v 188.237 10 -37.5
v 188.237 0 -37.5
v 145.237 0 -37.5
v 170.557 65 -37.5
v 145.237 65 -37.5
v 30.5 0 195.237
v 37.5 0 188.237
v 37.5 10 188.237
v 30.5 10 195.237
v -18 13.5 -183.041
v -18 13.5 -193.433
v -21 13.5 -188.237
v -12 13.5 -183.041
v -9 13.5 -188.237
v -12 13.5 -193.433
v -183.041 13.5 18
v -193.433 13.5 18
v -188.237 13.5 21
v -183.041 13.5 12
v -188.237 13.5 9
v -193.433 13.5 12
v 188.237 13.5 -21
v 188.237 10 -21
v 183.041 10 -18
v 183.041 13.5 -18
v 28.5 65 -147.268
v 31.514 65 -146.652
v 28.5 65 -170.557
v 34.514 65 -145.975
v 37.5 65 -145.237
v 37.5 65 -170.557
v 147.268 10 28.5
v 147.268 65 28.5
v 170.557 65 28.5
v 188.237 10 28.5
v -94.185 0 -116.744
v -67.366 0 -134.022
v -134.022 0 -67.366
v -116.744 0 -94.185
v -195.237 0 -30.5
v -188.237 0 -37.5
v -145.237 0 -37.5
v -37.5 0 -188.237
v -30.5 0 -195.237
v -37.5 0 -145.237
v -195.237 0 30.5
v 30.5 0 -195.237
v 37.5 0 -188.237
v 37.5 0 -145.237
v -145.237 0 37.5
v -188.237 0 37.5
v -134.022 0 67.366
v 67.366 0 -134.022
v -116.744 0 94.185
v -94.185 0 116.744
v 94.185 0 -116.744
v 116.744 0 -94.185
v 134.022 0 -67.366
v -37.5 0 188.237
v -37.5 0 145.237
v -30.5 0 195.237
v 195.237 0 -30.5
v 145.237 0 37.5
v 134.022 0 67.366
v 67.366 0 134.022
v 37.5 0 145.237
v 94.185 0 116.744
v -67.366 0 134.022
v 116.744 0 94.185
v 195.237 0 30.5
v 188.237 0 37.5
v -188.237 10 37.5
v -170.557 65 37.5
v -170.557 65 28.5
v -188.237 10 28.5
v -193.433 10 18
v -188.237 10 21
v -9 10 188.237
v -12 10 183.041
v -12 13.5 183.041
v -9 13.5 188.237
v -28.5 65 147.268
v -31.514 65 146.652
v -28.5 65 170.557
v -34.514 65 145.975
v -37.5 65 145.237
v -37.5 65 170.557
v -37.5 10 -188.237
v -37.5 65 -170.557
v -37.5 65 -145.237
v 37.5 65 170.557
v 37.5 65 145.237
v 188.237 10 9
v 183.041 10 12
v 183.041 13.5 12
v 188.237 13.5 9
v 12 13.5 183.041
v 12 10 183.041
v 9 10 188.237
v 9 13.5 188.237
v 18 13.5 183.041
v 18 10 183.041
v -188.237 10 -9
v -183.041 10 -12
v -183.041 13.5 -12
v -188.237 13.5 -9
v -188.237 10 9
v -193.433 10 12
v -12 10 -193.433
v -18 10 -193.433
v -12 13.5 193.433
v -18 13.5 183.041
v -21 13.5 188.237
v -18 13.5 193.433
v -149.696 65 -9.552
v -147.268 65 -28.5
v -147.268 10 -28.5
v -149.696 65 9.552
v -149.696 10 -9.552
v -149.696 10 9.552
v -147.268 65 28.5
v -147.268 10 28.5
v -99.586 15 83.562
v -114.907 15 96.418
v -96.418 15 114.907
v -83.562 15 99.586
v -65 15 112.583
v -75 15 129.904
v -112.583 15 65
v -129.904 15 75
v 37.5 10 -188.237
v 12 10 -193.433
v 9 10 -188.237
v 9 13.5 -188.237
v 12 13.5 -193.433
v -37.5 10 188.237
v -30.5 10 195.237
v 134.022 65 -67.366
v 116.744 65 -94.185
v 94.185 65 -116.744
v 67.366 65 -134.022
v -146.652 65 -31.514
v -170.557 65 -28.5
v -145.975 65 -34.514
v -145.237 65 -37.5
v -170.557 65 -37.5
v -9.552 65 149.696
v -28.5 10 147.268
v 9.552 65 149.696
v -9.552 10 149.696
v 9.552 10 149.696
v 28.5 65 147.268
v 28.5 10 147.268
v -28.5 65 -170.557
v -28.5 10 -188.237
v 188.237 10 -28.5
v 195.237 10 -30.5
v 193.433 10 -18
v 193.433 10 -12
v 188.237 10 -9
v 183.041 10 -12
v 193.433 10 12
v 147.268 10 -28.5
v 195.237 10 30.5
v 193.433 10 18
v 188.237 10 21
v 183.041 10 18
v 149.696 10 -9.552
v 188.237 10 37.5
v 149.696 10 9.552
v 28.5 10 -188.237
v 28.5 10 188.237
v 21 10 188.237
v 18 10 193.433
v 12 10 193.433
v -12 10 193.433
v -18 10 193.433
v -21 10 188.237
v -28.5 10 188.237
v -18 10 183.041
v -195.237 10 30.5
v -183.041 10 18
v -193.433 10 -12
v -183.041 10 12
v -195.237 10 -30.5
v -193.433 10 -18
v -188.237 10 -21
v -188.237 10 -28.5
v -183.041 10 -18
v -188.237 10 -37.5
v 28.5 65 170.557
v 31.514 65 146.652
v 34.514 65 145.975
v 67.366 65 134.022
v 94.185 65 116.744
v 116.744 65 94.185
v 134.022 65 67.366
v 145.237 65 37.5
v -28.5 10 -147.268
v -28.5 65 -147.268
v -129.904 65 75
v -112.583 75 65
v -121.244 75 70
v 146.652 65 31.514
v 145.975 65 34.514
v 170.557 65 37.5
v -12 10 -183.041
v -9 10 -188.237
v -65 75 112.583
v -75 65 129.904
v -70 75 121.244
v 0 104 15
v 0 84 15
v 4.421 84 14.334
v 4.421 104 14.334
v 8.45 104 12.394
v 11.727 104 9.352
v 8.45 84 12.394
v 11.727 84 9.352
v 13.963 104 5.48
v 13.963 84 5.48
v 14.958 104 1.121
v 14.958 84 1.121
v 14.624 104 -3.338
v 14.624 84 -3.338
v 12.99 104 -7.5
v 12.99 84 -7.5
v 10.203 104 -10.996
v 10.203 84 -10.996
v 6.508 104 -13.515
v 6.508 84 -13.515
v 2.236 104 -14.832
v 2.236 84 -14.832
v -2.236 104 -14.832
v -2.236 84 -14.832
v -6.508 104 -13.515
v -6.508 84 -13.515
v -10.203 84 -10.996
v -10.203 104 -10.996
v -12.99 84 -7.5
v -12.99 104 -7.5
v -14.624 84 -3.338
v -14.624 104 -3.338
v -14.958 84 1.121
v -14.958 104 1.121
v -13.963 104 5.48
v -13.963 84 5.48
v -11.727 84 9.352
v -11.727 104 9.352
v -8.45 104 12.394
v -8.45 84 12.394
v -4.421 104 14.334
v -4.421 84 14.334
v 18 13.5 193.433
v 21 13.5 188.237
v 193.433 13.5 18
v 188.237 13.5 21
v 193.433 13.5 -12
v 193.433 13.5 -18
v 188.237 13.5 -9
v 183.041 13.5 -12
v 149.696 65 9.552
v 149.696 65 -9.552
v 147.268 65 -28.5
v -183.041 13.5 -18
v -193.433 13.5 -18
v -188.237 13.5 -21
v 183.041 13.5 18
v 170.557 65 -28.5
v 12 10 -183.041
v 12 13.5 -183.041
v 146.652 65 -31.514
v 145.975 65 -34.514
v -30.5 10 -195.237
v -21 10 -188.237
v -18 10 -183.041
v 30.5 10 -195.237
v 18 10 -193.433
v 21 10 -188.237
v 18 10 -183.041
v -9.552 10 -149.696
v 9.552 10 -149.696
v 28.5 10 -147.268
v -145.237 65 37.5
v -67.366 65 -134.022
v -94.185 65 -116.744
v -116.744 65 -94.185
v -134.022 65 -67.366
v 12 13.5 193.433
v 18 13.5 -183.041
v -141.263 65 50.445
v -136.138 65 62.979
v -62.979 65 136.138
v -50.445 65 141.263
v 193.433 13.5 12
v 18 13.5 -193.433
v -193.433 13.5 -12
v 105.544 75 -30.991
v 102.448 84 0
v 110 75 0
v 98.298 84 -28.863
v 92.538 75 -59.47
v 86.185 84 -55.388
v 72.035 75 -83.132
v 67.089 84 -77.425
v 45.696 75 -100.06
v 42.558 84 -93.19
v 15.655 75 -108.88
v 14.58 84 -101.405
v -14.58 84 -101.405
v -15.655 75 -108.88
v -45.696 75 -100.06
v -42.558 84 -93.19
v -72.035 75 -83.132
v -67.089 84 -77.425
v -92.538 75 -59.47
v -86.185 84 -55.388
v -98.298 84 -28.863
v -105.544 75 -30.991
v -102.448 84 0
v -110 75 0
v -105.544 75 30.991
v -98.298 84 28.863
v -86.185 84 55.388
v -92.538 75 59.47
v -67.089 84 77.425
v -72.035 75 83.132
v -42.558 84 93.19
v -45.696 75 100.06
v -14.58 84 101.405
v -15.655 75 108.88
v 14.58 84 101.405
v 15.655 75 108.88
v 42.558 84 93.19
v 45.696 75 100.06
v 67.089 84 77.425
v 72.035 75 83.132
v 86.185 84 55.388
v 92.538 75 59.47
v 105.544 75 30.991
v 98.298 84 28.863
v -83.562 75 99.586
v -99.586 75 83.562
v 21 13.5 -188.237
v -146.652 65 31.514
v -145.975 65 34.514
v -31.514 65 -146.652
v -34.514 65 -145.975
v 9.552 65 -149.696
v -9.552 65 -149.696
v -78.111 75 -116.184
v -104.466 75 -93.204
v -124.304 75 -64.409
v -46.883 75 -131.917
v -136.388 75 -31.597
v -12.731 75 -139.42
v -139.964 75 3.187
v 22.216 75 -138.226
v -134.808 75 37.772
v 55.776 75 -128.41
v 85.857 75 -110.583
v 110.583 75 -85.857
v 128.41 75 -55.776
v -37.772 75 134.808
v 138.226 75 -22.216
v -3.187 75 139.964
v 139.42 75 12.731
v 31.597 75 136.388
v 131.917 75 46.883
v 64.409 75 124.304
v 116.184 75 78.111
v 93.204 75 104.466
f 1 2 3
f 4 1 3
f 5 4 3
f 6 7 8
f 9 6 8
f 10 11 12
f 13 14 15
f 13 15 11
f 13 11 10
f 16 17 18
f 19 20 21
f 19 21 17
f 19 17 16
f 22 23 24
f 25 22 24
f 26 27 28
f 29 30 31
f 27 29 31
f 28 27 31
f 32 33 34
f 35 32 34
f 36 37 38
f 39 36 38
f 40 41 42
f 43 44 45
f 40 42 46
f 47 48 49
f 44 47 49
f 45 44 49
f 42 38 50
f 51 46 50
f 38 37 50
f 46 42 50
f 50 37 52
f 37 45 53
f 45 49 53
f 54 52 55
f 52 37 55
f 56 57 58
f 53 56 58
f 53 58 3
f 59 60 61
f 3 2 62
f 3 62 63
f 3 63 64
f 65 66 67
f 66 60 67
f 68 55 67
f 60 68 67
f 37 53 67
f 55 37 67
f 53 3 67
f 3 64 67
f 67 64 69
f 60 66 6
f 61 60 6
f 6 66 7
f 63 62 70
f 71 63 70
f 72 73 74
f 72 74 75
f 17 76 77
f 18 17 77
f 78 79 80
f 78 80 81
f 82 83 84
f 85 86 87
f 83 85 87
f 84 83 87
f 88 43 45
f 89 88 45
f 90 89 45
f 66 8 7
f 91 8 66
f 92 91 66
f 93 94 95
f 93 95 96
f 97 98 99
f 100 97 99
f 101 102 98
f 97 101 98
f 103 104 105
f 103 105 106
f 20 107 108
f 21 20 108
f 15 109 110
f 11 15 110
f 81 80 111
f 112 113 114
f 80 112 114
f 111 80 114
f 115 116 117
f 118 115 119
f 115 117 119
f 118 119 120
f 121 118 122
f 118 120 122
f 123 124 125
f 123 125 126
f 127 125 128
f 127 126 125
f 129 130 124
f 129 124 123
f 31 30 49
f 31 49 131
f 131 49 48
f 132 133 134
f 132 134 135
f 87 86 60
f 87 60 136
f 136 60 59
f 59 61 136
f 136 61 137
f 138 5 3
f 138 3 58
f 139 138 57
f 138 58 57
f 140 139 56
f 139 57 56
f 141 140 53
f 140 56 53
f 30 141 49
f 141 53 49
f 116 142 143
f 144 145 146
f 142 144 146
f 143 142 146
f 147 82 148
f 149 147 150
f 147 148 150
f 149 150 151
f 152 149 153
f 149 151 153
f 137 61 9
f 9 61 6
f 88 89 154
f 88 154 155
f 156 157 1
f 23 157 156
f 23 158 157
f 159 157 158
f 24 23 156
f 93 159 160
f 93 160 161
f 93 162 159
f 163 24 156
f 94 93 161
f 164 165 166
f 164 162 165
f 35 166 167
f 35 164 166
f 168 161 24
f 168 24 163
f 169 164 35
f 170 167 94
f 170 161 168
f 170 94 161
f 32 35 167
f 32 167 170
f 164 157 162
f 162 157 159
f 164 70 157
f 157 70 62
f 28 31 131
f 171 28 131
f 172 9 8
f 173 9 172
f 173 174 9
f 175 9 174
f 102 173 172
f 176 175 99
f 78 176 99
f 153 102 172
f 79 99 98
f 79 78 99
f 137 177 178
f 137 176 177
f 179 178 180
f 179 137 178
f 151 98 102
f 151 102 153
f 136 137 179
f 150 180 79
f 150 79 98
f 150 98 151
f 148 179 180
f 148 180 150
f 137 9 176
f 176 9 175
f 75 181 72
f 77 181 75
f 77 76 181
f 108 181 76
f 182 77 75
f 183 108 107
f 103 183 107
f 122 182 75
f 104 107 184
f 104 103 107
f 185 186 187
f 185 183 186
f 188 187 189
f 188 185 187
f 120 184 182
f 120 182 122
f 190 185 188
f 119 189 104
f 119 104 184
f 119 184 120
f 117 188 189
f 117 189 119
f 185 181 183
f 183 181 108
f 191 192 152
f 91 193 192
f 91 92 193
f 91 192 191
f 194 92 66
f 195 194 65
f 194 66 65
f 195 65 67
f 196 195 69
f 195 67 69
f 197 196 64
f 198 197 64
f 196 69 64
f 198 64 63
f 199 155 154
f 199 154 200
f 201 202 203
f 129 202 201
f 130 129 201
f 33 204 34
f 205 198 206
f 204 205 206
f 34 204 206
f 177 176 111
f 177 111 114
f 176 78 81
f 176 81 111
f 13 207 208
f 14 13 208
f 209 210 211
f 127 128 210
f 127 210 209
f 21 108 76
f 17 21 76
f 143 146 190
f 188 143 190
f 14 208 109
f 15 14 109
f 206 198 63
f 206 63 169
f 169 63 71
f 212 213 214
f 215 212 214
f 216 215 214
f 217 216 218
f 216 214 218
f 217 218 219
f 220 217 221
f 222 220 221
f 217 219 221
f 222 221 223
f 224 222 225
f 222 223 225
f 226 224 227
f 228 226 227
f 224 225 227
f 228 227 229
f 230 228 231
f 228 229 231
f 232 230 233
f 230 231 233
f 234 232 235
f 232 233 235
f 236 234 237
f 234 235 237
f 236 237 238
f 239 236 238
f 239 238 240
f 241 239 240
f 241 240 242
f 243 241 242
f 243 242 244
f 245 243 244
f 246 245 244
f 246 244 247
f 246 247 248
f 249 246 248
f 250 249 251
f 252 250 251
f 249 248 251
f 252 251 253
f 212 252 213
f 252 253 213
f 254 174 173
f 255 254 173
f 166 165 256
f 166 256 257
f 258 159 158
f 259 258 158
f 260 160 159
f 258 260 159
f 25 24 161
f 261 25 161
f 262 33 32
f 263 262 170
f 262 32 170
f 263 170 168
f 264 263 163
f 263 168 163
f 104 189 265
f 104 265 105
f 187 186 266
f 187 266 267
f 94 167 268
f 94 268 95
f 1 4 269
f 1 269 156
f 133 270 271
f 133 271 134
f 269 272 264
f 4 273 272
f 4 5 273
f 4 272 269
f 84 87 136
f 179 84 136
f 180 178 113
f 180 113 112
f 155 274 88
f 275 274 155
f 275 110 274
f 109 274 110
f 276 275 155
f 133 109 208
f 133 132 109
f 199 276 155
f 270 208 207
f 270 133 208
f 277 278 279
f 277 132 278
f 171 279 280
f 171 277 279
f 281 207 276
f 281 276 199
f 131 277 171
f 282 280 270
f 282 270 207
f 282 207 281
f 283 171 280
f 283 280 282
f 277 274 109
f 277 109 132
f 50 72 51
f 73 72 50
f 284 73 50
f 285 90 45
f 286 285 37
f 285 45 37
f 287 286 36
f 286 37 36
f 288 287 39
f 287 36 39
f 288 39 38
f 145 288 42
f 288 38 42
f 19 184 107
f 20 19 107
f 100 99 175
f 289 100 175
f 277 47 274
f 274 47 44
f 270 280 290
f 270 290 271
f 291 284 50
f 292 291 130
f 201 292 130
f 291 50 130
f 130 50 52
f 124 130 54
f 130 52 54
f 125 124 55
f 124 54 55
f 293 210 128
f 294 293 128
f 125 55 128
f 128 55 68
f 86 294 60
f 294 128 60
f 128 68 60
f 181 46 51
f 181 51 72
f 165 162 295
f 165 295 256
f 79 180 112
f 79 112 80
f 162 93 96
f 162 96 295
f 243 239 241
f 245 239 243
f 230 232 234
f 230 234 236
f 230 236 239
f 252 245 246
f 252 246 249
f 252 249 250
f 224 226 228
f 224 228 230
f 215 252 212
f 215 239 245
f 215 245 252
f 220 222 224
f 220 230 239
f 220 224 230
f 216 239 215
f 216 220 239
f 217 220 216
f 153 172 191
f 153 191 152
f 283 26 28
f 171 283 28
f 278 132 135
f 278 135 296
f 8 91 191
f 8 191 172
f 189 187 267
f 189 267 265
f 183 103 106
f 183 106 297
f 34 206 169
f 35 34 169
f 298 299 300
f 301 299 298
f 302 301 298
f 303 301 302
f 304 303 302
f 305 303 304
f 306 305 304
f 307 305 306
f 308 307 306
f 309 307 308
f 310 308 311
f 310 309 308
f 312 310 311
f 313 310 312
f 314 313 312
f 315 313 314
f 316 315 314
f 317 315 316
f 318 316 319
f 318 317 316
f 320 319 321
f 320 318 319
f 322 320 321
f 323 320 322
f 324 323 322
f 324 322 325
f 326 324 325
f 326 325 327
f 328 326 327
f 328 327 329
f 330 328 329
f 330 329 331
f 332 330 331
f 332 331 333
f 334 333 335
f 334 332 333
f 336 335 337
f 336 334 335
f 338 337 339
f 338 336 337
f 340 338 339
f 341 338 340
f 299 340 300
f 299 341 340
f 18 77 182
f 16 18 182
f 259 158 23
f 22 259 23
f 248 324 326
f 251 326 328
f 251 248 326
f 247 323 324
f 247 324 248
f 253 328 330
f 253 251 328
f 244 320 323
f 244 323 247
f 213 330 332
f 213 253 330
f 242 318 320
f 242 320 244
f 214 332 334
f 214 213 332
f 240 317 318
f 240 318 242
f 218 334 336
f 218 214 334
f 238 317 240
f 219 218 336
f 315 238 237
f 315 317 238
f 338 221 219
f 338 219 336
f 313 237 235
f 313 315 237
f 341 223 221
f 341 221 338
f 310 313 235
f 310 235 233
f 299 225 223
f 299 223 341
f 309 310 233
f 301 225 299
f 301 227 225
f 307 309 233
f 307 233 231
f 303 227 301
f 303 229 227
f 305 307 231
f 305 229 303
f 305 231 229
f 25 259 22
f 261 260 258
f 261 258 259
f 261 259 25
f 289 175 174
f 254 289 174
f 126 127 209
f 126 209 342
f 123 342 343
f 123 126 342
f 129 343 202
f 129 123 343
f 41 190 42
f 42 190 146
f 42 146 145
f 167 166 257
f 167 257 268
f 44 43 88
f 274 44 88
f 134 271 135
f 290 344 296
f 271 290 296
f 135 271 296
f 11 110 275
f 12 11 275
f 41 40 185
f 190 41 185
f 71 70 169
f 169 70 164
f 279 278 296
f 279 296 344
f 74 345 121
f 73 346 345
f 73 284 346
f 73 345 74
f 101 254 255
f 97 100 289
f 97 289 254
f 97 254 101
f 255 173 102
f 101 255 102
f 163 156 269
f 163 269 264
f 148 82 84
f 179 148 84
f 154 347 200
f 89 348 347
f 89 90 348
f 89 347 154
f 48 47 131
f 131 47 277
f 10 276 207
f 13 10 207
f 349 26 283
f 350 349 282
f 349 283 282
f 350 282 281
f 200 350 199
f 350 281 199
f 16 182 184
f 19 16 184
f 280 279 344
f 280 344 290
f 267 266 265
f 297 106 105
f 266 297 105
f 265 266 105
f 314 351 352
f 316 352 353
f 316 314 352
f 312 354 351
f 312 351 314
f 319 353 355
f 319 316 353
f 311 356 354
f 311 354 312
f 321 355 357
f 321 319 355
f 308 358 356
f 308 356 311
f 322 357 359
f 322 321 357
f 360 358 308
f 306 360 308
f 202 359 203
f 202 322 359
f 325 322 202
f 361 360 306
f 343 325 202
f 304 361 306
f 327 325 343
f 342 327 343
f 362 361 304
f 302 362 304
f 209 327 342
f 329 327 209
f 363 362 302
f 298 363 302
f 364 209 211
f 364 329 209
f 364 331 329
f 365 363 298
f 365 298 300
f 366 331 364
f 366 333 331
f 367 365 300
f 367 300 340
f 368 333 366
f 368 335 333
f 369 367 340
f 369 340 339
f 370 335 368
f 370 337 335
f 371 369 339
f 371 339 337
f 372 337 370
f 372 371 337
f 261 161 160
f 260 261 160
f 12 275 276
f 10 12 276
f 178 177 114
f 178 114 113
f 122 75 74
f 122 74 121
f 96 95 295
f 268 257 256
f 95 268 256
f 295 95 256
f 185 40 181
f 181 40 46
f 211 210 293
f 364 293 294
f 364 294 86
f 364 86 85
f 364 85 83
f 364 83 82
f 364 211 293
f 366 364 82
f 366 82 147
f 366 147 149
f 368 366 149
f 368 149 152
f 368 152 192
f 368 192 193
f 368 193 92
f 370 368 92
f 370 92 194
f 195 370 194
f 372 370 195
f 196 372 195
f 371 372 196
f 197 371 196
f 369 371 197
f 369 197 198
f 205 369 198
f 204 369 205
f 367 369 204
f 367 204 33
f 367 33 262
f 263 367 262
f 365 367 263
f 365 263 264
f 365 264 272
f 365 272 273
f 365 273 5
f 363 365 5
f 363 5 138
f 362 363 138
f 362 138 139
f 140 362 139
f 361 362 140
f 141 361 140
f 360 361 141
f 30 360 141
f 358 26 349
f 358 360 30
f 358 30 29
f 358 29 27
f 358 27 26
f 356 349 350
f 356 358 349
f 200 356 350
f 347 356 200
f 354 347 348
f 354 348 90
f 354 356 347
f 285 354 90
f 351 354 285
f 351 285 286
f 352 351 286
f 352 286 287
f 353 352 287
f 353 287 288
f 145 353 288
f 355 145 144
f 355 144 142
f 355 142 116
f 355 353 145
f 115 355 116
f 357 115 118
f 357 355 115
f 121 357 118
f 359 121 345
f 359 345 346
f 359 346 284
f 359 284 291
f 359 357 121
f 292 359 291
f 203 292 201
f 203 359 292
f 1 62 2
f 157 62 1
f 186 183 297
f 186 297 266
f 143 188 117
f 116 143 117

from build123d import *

# Parameters (mm, degrees)
SKETCH1_R                    = 150
BOSS_EXTRUDE1_DEPTH          = 75
CHAMFER1_SIZE                = 10
BOSS_EXTRUDE2_START          = -75
BOSS_EXTRUDE2_DEPTH          = 10
CHAMFER2_SIZE                = 7
BOSS_EXTRUDE3_DEPTH          = 9
BOSS_EXTRUDE4_DEPTH          = 3.5
CIRPATTERN1_COUNT            = 4
CIRPATTERN1_COPY_1_DEPTH     = 9
CIRPATTERN1_COPY_2_DEPTH     = 9
CIRPATTERN1_COPY_3_DEPTH     = 9
CIRPATTERN1_COPY_4_DEPTH     = 3.5
CIRPATTERN1_COPY_5_DEPTH     = 3.5
CIRPATTERN1_COPY_6_DEPTH     = 3.5
CHAMFER2_OF_CIRPATTERN1_SIZE = 7
CUT_EXTRUDE1_START           = -60
CUT_EXTRUDE1_DEPTH           = 60
SKETCH6_R                    = 110
BOSS_EXTRUDE5_DEPTH          = 9
BOSS_EXTRUDE5_TAPER          = 40
SKETCH7_R                    = 15
BOSS_EXTRUDE6_DEPTH          = 20


with BuildPart() as part:
    # Sketch1 → Boss-Extrude1 (new body)
    with BuildSketch(Plane(origin=(0, 0, 0), x_dir=(1, 0, 0), z_dir=(0, 1, 0))):
        with Locations(Location((0, 0, 0), (0, 0, 270))):
            Circle(SKETCH1_R)
    extrude(amount=BOSS_EXTRUDE1_DEPTH)

    # Chamfer1
    chamfer1_edges = [part.edges().sort_by_distance(p)[0] for p in [
        (0, 75, -150),
    ]]
    chamfer(chamfer1_edges, length=CHAMFER1_SIZE)

    # Sketch2 → Boss-Extrude2 (add)
    with BuildSketch(Plane(origin=(0, 75, 0), x_dir=(1, 0, 0), z_dir=(0, 1, 0)).offset(BOSS_EXTRUDE2_START)):
        with BuildLine():
            Line((-145.236875483, 37.5), (-195.236875483, 37.5))
            Line((-195.236875483, 37.5), (-195.236875483, -37.5))
            Line((-195.236875483, -37.5), (-145.236875483, -37.5))
            ThreePointArc((-145.236875483, -37.5), (-150, 0), (-145.236875483, 37.5))
        make_face()
    boss_extrude2 = extrude(amount=BOSS_EXTRUDE2_DEPTH)

    # Chamfer2
    chamfer2_edges = [part.edges().sort_by_distance(p)[0] for p in [
        (-195.236875483, 5, -37.5),
        (-195.236875483, 5, 37.5),
    ]]
    chamfer(chamfer2_edges, length=CHAMFER2_SIZE)

    # Sketch3 → Boss-Extrude3 (add)
    with BuildSketch(Plane.XY.offset(37.5)):
        Polygon((-145.236875483, 10), (-145.236875483, 65), (-170.556875483, 65), (-188.236875483, 10), align=None)
    boss_extrude3 = extrude(amount=-BOSS_EXTRUDE3_DEPTH)

    # Sketch4 → Boss-Extrude4 (add)
    with BuildSketch(Plane(origin=(0, 10, 0), x_dir=(1, 0, 0), z_dir=(0, 1, 0))):
        Polygon((-188.236875483, -21), (-183.04072306, -18), (-183.04072306, -12), (-188.236875483, -9), (-193.433027905, -12), (-193.433027905, -18), align=None)
    boss_extrude4 = extrude(amount=BOSS_EXTRUDE4_DEPTH)

    # Mirror1: Boss-Extrude3, Boss-Extrude4 across plane
    add(boss_extrude3.mirror(Plane.XY))
    add(boss_extrude4.mirror(Plane.XY))

    # CirPattern1: Boss-Extrude2, Boss-Extrude3, Boss-Extrude4 ×4 about axis
    cirpattern1_axis = Axis((0, 0, 0), (0, 1, 0))
    add([boss_extrude2.rotate(cirpattern1_axis, i * 360 / CIRPATTERN1_COUNT) for i in range(1, CIRPATTERN1_COUNT)])
    add([boss_extrude3.rotate(cirpattern1_axis, i * 360 / CIRPATTERN1_COUNT) for i in range(1, CIRPATTERN1_COUNT)])
    add([boss_extrude4.rotate(cirpattern1_axis, i * 360 / CIRPATTERN1_COUNT) for i in range(1, CIRPATTERN1_COUNT)])

    # CirPattern1 copy 1 sketch → CirPattern1 copy 1 (add)
    with BuildSketch(Plane(origin=(-37.5, 0, 0), x_dir=(0, 0, -1), z_dir=(-1, 0, 0))):
        Polygon((-145.236875483, -10), (-145.236875483, -65), (-170.556875483, -65), (-188.236875483, -10), align=None)
    extrude(amount=-CIRPATTERN1_COPY_1_DEPTH)

    # CirPattern1 copy 2 sketch → CirPattern1 copy 2 (add)
    with BuildSketch(Plane(origin=(0, 0, 37.5), x_dir=(-1, 0, 0), z_dir=(0, 0, 1))):
        Polygon((-145.236875483, -10), (-145.236875483, -65), (-170.556875483, -65), (-188.236875483, -10), align=None)
    extrude(amount=-CIRPATTERN1_COPY_2_DEPTH)

    # CirPattern1 copy 3 sketch → CirPattern1 copy 3 (add)
    with BuildSketch(Plane(origin=(37.5, 0, 0), x_dir=(0, 0, 1), z_dir=(1, 0, 0))):
        Polygon((-145.236875483, -10), (-145.236875483, -65), (-170.556875483, -65), (-188.236875483, -10), align=None)
    extrude(amount=-CIRPATTERN1_COPY_3_DEPTH)

    # CirPattern1 copy 4 sketch → CirPattern1 copy 4 (add)
    with BuildSketch(Plane(origin=(0, 10, 0), x_dir=(0, 0, -1), z_dir=(0, 1, 0))):
        Polygon((-188.236875483, 21), (-183.04072306, 18), (-183.04072306, 12), (-188.236875483, 9), (-193.433027905, 12), (-193.433027905, 18), align=None)
    extrude(amount=CIRPATTERN1_COPY_4_DEPTH)

    # CirPattern1 copy 5 sketch → CirPattern1 copy 5 (add)
    with BuildSketch(Plane(origin=(0, 10, 0), x_dir=(-1, 0, 0), z_dir=(0, 1, 0))):
        Polygon((-188.236875483, 21), (-183.04072306, 18), (-183.04072306, 12), (-188.236875483, 9), (-193.433027905, 12), (-193.433027905, 18), align=None)
    extrude(amount=CIRPATTERN1_COPY_5_DEPTH)

    # CirPattern1 copy 6 sketch → CirPattern1 copy 6 (add)
    with BuildSketch(Plane.ZX.offset(10)):
        Polygon((-188.236875483, 21), (-183.04072306, 18), (-183.04072306, 12), (-188.236875483, 9), (-193.433027905, 12), (-193.433027905, 18), align=None)
    extrude(amount=CIRPATTERN1_COPY_6_DEPTH)

    # Chamfer2 of CirPattern1
    chamfer2_of_cirpattern1_edges = [part.edges().sort_by_distance(p)[0] for p in [
        (-37.5, 5, 195.236875483),
        (37.5, 5, 195.236875483),
        (195.236875483, 5, 37.5),
        (195.236875483, 5, -37.5),
        (37.5, 5, -195.236875483),
        (-37.5, 5, -195.236875483),
    ]]
    chamfer(chamfer2_of_cirpattern1_edges, length=CHAMFER2_OF_CIRPATTERN1_SIZE)

    # Sketch5 → Cut-Extrude1 (cut)
    with BuildSketch(Plane(origin=(0, 75, 0), x_dir=(1, 0, 0), z_dir=(0, 1, 0)).offset(CUT_EXTRUDE1_START)):
        with BuildLine():
            ThreePointArc((-70, -121.24355653), (-98.994949366, -98.994949366), (-121.24355653, -70))
            Line((-121.24355653, -70), (-129.903810568, -75))
            ThreePointArc((-129.903810568, -75), (-106.066017178, -106.066017178), (-75, -129.903810568))
            Line((-75, -129.903810568), (-70, -121.24355653))
        make_face()
        with BuildLine():
            ThreePointArc((-65, -112.583302492), (-91.923881554, -91.923881554), (-112.583302492, -65))
            Line((-112.583302492, -65), (-121.24355653, -70))
            ThreePointArc((-121.24355653, -70), (-98.994949366, -98.994949366), (-70, -121.24355653))
            Line((-70, -121.24355653), (-65, -112.583302492))
        make_face()
    extrude(amount=CUT_EXTRUDE1_DEPTH, mode=Mode.SUBTRACT)

    # Sketch6 → Boss-Extrude5 (add)
    with BuildSketch(Plane(origin=(0, 75, 0), x_dir=(1, 0, 0), z_dir=(0, 1, 0))):
        Circle(SKETCH6_R)
    extrude(amount=BOSS_EXTRUDE5_DEPTH, taper=BOSS_EXTRUDE5_TAPER)

    # Sketch7 → Boss-Extrude6 (add)
    with BuildSketch(Plane(origin=(0, 84, 0), x_dir=(1, 0, 0), z_dir=(0, 1, 0))):
        with Locations(Location((0, 0, 0), (0, 0, 270))):
            Circle(SKETCH7_R)
    extrude(amount=BOSS_EXTRUDE6_DEPTH)


solid = part.part
